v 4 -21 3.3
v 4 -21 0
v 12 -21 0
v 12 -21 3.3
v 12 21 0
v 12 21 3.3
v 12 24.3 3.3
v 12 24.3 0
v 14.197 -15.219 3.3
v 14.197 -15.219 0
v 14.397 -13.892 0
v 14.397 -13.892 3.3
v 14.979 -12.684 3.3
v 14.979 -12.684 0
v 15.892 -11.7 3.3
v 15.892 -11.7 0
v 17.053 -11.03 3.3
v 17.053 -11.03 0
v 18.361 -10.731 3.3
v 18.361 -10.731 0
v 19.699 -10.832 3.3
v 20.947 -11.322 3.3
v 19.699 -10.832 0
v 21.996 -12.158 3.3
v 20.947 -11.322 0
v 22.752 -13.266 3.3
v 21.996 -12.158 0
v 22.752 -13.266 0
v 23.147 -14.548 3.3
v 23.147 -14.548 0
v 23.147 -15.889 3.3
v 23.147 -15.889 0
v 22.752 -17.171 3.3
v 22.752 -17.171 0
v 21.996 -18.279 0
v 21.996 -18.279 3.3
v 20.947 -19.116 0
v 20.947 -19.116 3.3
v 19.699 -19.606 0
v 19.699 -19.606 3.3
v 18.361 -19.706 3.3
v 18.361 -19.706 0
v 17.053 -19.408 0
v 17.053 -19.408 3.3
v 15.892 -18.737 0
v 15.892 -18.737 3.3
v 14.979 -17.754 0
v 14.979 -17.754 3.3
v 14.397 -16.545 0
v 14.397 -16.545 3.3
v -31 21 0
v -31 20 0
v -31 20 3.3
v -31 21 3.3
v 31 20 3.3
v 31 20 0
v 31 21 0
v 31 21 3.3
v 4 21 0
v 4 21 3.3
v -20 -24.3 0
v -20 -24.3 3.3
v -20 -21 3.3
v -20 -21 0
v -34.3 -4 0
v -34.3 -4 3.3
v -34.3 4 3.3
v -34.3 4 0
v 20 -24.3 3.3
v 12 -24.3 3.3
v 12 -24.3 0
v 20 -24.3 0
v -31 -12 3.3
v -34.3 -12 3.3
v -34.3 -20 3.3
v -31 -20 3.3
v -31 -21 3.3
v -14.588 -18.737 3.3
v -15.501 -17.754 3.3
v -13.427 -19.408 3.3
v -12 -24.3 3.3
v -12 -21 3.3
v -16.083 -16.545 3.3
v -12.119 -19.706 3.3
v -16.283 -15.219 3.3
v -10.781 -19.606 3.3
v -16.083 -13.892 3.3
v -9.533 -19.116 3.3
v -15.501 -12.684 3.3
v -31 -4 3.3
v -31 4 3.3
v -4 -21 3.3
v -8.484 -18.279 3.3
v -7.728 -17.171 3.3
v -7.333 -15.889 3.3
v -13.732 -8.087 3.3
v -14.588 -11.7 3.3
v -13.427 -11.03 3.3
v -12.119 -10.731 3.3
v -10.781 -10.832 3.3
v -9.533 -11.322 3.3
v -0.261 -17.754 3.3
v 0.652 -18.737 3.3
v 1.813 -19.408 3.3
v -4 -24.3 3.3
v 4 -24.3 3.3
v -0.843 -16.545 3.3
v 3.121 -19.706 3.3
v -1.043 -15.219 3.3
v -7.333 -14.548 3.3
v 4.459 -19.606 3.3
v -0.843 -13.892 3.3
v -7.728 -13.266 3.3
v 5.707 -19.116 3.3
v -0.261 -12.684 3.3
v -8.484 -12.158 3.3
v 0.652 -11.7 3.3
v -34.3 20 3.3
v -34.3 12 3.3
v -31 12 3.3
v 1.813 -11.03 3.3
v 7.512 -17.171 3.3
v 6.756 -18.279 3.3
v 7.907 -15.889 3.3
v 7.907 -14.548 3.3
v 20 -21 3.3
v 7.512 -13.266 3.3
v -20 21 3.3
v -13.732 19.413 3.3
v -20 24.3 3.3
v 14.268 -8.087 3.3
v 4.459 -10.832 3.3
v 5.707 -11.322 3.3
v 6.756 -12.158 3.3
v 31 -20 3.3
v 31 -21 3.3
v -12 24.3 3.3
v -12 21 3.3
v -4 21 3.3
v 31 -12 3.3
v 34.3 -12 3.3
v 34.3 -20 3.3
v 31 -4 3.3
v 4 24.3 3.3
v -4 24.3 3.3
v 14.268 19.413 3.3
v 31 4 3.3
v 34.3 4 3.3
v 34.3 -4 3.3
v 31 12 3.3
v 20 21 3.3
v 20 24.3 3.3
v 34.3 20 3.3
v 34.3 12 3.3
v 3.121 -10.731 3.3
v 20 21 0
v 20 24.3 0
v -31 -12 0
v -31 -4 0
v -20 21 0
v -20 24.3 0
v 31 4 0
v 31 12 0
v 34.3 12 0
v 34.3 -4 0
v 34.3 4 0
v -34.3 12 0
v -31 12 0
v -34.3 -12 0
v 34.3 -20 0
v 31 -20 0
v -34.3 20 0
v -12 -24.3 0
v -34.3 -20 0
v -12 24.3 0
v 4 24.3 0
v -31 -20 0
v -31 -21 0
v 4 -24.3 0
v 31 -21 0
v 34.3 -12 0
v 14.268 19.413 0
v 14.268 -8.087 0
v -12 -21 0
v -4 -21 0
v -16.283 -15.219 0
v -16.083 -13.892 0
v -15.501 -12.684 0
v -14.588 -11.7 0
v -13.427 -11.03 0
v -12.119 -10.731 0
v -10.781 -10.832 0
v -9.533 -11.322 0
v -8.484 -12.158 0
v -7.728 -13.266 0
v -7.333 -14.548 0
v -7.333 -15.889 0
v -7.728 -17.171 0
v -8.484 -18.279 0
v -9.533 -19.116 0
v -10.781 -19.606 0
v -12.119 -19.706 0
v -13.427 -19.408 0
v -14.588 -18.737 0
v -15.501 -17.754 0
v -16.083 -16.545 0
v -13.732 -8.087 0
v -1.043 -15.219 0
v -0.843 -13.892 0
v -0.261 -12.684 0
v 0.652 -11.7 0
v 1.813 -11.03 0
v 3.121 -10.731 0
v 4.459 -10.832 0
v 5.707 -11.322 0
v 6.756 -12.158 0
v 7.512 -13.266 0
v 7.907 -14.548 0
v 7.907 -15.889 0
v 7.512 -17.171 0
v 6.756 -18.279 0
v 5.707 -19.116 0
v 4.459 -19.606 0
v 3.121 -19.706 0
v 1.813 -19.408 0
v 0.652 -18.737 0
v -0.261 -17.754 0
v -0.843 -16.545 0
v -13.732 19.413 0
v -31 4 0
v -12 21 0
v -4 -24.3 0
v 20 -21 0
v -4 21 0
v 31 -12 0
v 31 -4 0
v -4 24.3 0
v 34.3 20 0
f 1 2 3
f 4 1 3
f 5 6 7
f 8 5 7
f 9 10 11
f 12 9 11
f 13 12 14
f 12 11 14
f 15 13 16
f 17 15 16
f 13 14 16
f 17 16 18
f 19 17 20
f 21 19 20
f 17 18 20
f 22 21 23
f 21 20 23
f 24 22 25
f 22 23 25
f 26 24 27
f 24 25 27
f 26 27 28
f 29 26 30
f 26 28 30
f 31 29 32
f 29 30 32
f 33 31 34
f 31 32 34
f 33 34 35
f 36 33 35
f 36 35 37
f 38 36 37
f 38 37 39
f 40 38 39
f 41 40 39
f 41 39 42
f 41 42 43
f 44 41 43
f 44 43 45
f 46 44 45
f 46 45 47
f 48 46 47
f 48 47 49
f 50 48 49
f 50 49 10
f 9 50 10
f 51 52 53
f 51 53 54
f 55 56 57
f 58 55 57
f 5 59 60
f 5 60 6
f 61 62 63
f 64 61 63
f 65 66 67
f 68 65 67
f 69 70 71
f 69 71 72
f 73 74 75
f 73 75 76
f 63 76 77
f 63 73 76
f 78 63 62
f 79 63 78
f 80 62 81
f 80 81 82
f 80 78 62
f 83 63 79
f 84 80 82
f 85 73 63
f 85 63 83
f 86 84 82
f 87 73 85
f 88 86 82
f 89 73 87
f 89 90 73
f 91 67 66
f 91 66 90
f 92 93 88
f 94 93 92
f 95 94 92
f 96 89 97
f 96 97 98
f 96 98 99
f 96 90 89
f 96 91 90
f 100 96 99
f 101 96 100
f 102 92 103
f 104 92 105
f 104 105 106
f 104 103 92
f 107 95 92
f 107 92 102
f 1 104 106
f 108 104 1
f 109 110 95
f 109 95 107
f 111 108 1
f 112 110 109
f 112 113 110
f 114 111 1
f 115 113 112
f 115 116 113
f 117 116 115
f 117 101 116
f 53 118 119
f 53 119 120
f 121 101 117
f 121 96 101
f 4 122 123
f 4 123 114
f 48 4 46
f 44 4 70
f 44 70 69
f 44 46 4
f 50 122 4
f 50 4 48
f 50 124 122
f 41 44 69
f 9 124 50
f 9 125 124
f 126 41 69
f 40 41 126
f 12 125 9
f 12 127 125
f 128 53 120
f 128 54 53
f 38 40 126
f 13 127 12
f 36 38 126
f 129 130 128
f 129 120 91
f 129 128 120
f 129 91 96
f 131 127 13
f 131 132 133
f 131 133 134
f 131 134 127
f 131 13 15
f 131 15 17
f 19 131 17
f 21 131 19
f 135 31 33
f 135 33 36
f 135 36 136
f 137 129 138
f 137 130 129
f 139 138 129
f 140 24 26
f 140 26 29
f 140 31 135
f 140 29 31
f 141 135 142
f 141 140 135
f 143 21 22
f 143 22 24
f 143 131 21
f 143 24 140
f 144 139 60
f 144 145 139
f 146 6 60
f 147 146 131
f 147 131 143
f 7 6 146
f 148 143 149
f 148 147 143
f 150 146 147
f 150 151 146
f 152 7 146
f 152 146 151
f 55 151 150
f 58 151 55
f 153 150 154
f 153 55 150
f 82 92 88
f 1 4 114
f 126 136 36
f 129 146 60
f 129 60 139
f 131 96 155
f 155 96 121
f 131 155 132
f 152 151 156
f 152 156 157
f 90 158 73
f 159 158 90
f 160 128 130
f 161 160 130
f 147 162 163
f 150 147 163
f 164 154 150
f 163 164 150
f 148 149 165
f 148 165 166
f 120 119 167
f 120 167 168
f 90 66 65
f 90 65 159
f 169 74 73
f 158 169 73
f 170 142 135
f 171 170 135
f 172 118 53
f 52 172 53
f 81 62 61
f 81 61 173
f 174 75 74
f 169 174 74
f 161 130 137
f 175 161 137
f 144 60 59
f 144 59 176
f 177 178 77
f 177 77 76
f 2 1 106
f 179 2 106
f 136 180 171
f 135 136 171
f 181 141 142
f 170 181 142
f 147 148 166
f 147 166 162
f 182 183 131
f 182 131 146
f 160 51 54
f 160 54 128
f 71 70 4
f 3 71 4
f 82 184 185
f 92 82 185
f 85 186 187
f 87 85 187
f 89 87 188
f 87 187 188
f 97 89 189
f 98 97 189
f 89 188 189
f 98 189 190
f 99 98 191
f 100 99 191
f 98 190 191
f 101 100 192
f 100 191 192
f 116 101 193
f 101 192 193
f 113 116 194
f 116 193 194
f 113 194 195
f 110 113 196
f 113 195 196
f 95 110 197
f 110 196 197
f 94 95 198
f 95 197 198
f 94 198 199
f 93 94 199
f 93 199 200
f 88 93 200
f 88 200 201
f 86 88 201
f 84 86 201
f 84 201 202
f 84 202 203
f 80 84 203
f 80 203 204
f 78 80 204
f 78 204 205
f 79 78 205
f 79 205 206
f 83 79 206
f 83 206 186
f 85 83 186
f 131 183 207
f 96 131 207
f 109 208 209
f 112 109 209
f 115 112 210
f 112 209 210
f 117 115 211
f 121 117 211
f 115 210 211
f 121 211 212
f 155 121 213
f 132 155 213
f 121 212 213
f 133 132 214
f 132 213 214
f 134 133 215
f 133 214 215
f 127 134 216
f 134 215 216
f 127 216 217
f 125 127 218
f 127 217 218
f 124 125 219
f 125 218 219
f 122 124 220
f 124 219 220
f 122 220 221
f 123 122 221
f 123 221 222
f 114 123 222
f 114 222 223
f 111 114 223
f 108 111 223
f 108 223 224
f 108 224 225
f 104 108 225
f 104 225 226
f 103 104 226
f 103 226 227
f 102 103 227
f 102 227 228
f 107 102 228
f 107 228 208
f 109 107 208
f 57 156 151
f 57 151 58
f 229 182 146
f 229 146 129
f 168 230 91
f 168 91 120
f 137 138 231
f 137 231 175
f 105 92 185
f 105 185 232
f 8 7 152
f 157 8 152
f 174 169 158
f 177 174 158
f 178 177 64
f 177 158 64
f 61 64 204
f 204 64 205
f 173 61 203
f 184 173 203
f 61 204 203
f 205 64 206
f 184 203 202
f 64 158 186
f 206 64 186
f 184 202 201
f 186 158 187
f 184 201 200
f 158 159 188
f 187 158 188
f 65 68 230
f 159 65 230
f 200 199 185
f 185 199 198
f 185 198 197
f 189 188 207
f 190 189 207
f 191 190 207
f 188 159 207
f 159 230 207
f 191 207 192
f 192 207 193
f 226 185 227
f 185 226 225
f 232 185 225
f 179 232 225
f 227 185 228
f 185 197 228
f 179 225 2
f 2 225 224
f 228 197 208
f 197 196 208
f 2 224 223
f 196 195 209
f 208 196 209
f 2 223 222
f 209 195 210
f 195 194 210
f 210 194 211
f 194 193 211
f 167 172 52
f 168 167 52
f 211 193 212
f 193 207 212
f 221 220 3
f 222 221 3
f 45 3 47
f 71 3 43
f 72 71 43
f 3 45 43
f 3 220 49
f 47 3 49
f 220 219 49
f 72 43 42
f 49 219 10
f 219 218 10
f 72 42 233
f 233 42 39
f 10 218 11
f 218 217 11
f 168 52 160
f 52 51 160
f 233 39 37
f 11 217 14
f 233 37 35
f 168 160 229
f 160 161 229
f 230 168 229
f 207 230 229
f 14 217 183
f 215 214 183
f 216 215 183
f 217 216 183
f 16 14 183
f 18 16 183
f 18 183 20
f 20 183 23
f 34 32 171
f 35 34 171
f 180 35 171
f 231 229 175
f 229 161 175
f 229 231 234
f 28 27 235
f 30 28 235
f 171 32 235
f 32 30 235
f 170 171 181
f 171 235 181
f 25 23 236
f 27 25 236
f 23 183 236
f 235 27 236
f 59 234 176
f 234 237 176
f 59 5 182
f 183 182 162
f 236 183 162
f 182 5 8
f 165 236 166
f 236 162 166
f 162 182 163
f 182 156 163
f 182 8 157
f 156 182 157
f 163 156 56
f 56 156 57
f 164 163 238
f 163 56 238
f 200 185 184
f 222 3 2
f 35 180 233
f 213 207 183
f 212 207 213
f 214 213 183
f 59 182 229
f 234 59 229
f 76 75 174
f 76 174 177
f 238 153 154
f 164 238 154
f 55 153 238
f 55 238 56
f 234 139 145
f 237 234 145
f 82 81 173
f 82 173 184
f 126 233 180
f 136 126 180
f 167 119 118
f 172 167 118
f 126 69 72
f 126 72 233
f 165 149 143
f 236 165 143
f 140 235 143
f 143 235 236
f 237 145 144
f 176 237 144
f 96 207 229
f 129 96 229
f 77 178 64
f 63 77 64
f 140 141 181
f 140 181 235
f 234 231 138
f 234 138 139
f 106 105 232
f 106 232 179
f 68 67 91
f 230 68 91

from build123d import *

# Parameters (mm, degrees)
ESQUISSE1_W                    = 62
ESQUISSE1_H                    = 42
BOSS_EXTRU_1_DEPTH             = 3.3
ESQUISSE2_W                    = 8
ESQUISSE2_H                    = 3.3
BOSS_EXTRU_2_DEPTH             = 3.3
R_P_TITION_LIN_AIRE1_COUNT     = 2
R_P_TITION_LIN_AIRE1_PITCH     = 16
R_P_TITION_LIN_AIRE1_COL_COUNT = 2
R_P_TITION_LIN_AIRE1_COL_PITCH = 16
SYM_TRIE1_COPY_1_SKETCH_W      = 8
SYM_TRIE1_COPY_1_SKETCH_H      = 3.3
SYM_TRIE1_COPY_1_DEPTH         = 3.3
SYM_TRIE1_COPY_2_SKETCH_W      = 8
SYM_TRIE1_COPY_2_SKETCH_H      = 3.3
SYM_TRIE1_COPY_2_DEPTH         = 3.3
ESQUISSE3_W                    = 3.3
ESQUISSE3_H                    = 8
BOSS_EXTRU_3_DEPTH             = 3.3
R_P_TITION_LIN_AIRE2_COUNT     = 2
R_P_TITION_LIN_AIRE2_PITCH     = 16
R_P_TITION_LIN_AIRE2_COL_COUNT = 2
R_P_TITION_LIN_AIRE2_COL_PITCH = 16
SYM_TRIE2_COPY_1_SKETCH_W      = 3.3
SYM_TRIE2_COPY_1_SKETCH_H      = 8
SYM_TRIE2_COPY_1_DEPTH         = 3.3
SYM_TRIE2_COPY_2_SKETCH_W      = 3.3
SYM_TRIE2_COPY_2_SKETCH_H      = 8
SYM_TRIE2_COPY_2_DEPTH         = 3.3
ESQUISSE4_R                    = 4.5
ESQUISSE4_W                    = 28
ESQUISSE4_H                    = 27.5
ENL_V_MAT_EXTRU_2_DEPTH        = 1
ENL_V_MAT_EXTRU_2_DEPTH_BACK   = 4.3


with BuildPart() as part:
    # Esquisse1 → Boss.-Extru.1 (new body)
    with BuildSketch(Plane.XY):
        Rectangle(ESQUISSE1_W, ESQUISSE1_H)
    extrude(amount=BOSS_EXTRU_1_DEPTH)

    # Esquisse2 → Boss.-Extru.2 (add)
    with BuildSketch(Plane.XY.offset(3.3)):
        with Locations((0, 22.65)):
            Rectangle(ESQUISSE2_W, ESQUISSE2_H)
    boss_extru_2 = extrude(amount=-BOSS_EXTRU_2_DEPTH)

    # Répétition linéaire1: Boss.-Extru.2 ×2
    with Locations(*[(-i * R_P_TITION_LIN_AIRE1_PITCH, 0, 0) for i in range(1, R_P_TITION_LIN_AIRE1_COUNT)]):
        add(boss_extru_2)

    # Répétition linéaire1 col: Boss.-Extru.2 ×2
    with Locations(*[(i * R_P_TITION_LIN_AIRE1_COL_PITCH, 0, 0) for i in range(1, R_P_TITION_LIN_AIRE1_COL_COUNT)]):
        add(boss_extru_2)

    # Symétrie1: Boss.-Extru.2 across plane
    add(boss_extru_2.mirror(Plane.ZX))

    # Symétrie1 copy 1 sketch → Symétrie1 copy 1 (add)
    with BuildSketch(Plane(origin=(-16, 0, 3.3), x_dir=(1, 0, 0), z_dir=(0, 0, 1))):
        with Locations((0, -22.65)):
            Rectangle(SYM_TRIE1_COPY_1_SKETCH_W, SYM_TRIE1_COPY_1_SKETCH_H)
    extrude(amount=-SYM_TRIE1_COPY_1_DEPTH)

    # Symétrie1 copy 2 sketch → Symétrie1 copy 2 (add)
    with BuildSketch(Plane(origin=(16, 0, 3.3), x_dir=(1, 0, 0), z_dir=(0, 0, 1))):
        with Locations((0, -22.65)):
            Rectangle(SYM_TRIE1_COPY_2_SKETCH_W, SYM_TRIE1_COPY_2_SKETCH_H)
    extrude(amount=-SYM_TRIE1_COPY_2_DEPTH)

    # Esquisse3 → Boss.-Extru.3 (add)
    with BuildSketch(Plane.XY.offset(3.3)):
        with Locations((-32.65, 0)):
            Rectangle(ESQUISSE3_W, ESQUISSE3_H)
    boss_extru_3 = extrude(amount=-BOSS_EXTRU_3_DEPTH)

    # Répétition linéaire2: Boss.-Extru.3 ×2
    with Locations(*[(0, i * R_P_TITION_LIN_AIRE2_PITCH, 0) for i in range(1, R_P_TITION_LIN_AIRE2_COUNT)]):
        add(boss_extru_3)

    # Répétition linéaire2 col: Boss.-Extru.3 ×2
    with Locations(*[(0, -i * R_P_TITION_LIN_AIRE2_COL_PITCH, 0) for i in range(1, R_P_TITION_LIN_AIRE2_COL_COUNT)]):
        add(boss_extru_3)

    # Symétrie2: Boss.-Extru.3 across plane
    add(boss_extru_3.mirror(Plane(origin=(0, 0, 0), x_dir=(0, 0, 1), z_dir=(1, 0, 0))))

    # Symétrie2 copy 1 sketch → Symétrie2 copy 1 (add)
    with BuildSketch(Plane(origin=(0, 16, 3.3), x_dir=(-1, 0, 0), z_dir=(0, 0, 1))):
        with Locations((-32.65, 0)):
            Rectangle(SYM_TRIE2_COPY_1_SKETCH_W, SYM_TRIE2_COPY_1_SKETCH_H)
    extrude(amount=-SYM_TRIE2_COPY_1_DEPTH)

    # Symétrie2 copy 2 sketch → Symétrie2 copy 2 (add)
    with BuildSketch(Plane(origin=(0, -16, 3.3), x_dir=(-1, 0, 0), z_dir=(0, 0, 1))):
        with Locations((-32.65, 0)):
            Rectangle(SYM_TRIE2_COPY_2_SKETCH_W, SYM_TRIE2_COPY_2_SKETCH_H)
    extrude(amount=-SYM_TRIE2_COPY_2_DEPTH)

    # Esquisse4 → Enlèv. mat.-Extru.2 (cut, two sides)
    with BuildSketch(Plane(origin=(0, 0, 0), x_dir=(-1, 0, 0), z_dir=(0, 0, -1))) as enl_v_mat_extru_2_sk:
        with Locations((-18.697468538, -15.21869301)):
            Circle(ESQUISSE4_R)
        with Locations((-3.457468538, -15.21869301)):
            Circle(ESQUISSE4_R)
        with Locations((11.782531462, -15.21869301)):
            Circle(ESQUISSE4_R)
        with Locations((-0.267723221, 5.663046026)):
            Rectangle(ESQUISSE4_W, ESQUISSE4_H)
    extrude(amount=ENL_V_MAT_EXTRU_2_DEPTH, mode=Mode.SUBTRACT)
    extrude(enl_v_mat_extru_2_sk.sketch, amount=-ENL_V_MAT_EXTRU_2_DEPTH_BACK, mode=Mode.SUBTRACT)


solid = part.part
